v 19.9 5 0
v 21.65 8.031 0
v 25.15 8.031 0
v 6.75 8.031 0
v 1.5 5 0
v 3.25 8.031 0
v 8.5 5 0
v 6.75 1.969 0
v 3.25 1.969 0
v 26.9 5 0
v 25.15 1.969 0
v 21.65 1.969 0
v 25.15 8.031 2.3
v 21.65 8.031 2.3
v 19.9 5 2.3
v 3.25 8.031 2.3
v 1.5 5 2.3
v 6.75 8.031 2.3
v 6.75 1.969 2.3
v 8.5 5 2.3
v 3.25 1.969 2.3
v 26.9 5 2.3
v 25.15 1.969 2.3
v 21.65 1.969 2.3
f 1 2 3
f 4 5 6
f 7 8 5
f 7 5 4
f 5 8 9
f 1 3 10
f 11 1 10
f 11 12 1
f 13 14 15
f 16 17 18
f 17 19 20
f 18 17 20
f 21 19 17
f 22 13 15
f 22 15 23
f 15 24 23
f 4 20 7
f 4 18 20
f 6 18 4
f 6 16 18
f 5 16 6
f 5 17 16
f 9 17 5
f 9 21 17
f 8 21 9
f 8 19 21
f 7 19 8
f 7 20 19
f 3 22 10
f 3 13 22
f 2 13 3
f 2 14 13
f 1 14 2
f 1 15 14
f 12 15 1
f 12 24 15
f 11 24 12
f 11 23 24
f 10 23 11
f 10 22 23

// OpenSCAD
// Copyright (C) 2025 Arif K. Rafiq
// This program is free software: you can redistribute it and/or modify
// it under the terms of the GNU General Public License as published by
// the Free Software Foundation, either version 3 of the License, or
// (at your option) any later version.

// This program is distributed in the hope that it will be useful,
// but WITHOUT ANY WARRANTY; without even the implied warranty of
// MERCHANTABILITY or FITNESS FOR A PARTICULAR PURPOSE.  See the
// GNU General Public License for more details.

// You should have received a copy of the GNU General Public License
// along with this file.  If not, see <https://www.gnu.org/licenses/>,
// or write to: license@temperedoptimism.com

// hexSinkRadious = 3.50;
// hexSinkIntensity = 2.30;

pHexSink = [3.5, 2.3];
vTerminal0 = [5.0, 5.0];
vTerminal1 = [23.4, 5.0];
// hex pocket

// Simple
// translate(vTerminal0) linear_extrude(pHexSink.y) circle(pHexSink.x);
// translate(vTerminal1) linear_extrude(pHexSink.y) circle(pHexSink.x);
//12:43
linear_extrude(pHexSink.y){

      translate(vTerminal0)  circle(pHexSink.x, $fn=6);
      translate(vTerminal1)  circle(pHexSink.x, $fn=6);
}
